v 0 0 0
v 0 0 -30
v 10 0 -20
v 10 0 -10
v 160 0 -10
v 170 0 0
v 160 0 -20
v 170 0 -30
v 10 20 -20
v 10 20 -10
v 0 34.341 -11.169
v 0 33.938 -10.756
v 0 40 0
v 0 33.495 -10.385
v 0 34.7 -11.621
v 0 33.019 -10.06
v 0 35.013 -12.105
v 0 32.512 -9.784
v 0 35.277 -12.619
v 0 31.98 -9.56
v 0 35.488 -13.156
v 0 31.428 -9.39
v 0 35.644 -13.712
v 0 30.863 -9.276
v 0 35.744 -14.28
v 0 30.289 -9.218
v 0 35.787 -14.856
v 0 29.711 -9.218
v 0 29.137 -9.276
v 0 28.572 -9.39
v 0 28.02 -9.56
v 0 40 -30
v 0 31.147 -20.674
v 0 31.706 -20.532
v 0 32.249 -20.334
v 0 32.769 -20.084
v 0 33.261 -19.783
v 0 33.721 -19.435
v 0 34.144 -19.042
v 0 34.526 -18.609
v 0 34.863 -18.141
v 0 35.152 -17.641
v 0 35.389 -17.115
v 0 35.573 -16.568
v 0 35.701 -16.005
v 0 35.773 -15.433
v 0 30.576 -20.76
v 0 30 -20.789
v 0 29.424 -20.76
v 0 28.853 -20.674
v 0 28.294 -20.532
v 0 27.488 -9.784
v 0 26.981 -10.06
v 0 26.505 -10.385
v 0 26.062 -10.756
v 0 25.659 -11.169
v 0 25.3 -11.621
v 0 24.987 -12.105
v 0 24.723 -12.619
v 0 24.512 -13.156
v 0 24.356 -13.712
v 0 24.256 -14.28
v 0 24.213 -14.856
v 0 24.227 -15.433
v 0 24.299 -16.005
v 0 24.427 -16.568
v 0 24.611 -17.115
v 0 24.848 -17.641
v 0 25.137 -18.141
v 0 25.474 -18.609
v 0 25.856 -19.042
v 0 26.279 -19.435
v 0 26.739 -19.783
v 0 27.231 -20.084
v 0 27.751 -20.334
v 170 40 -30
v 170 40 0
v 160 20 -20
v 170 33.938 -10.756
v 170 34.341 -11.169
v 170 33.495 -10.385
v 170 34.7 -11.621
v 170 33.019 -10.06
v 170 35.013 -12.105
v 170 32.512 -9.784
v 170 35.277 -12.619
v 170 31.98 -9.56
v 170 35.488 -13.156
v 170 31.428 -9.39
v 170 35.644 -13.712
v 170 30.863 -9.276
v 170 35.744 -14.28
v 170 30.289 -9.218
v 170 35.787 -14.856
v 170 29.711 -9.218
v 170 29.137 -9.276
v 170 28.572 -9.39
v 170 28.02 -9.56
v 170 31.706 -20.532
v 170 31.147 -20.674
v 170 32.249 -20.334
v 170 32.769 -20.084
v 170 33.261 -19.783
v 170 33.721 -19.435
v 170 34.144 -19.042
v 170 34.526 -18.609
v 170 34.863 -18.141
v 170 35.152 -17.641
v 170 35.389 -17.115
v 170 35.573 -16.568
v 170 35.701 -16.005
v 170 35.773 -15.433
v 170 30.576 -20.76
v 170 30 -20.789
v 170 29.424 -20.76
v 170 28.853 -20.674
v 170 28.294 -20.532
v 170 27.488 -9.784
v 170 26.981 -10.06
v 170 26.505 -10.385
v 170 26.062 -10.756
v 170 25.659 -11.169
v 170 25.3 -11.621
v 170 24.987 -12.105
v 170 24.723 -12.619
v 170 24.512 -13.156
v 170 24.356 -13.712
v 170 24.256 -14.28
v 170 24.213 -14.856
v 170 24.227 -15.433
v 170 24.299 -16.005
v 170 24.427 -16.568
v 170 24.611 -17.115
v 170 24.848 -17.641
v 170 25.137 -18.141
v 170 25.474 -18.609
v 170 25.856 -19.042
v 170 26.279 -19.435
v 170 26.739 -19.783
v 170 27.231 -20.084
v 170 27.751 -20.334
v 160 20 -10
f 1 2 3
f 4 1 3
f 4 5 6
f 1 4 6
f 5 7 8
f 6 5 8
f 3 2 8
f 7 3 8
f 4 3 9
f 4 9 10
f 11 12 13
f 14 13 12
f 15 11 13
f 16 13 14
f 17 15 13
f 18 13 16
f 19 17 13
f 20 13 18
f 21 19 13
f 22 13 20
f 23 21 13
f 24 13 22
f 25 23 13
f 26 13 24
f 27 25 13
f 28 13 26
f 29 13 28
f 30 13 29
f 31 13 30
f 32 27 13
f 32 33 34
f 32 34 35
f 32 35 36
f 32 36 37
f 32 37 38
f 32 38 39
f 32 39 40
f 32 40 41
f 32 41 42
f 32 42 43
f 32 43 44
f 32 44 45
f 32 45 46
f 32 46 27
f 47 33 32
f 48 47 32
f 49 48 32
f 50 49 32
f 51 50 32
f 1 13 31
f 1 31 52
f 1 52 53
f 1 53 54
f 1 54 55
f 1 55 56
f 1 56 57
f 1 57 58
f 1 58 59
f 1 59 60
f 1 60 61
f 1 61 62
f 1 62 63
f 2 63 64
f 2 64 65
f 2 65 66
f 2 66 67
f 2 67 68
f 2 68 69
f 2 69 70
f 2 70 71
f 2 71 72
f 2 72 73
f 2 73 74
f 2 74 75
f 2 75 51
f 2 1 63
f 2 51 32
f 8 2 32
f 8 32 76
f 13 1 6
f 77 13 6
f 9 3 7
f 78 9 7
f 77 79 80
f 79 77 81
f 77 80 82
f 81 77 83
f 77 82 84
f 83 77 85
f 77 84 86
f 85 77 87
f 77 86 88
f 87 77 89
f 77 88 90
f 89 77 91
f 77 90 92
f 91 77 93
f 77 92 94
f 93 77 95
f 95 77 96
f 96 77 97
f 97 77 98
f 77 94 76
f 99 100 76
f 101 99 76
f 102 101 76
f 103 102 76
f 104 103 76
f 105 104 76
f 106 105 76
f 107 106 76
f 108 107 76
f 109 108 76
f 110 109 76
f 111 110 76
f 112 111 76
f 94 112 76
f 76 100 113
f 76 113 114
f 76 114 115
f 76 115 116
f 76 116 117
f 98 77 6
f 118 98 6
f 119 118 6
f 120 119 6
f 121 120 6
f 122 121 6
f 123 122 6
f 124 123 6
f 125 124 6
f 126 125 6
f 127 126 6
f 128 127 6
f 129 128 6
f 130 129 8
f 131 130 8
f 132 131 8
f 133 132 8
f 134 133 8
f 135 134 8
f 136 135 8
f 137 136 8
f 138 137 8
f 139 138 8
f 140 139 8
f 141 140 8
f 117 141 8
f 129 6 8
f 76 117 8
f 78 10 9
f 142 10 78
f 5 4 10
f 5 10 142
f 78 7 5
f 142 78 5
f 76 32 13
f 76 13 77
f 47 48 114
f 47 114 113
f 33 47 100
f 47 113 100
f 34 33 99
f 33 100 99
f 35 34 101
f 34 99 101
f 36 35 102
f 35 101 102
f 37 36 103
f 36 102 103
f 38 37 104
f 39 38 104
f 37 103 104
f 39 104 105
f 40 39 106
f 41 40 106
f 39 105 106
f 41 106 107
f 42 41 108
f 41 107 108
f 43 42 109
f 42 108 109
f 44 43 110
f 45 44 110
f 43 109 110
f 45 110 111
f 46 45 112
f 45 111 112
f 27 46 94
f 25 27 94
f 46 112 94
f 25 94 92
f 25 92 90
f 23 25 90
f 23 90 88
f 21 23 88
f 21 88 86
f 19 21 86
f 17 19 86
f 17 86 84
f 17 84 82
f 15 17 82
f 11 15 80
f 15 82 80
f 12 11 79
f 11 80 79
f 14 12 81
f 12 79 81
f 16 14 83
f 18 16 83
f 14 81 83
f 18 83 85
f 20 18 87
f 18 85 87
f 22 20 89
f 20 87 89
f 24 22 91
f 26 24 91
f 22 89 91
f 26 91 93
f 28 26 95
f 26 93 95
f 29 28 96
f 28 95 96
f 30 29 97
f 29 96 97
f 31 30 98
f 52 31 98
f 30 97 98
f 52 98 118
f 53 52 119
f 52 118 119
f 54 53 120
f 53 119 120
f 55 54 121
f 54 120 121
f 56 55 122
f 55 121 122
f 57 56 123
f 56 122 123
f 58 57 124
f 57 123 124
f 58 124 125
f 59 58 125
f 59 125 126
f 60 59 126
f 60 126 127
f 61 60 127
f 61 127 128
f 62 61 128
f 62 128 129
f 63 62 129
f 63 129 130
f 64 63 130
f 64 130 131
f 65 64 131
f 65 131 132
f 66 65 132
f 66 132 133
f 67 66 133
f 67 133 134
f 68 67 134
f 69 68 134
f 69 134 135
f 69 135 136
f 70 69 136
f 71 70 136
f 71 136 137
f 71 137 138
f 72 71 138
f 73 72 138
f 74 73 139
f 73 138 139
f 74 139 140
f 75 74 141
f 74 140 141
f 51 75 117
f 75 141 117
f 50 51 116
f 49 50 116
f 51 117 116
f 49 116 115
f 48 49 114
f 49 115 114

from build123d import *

# Parameters (mm, degrees)
SKETCH2_W           = 170
SKETCH2_H           = 30
BOSS_EXTRUDE1_DEPTH = 40
SKETCH3_W           = 150
SKETCH3_H           = 10
CUT_EXTRUDE1_DEPTH  = 20
SKETCH4_R           = 5.789067321
CUT_EXTRUDE2_DEPTH  = 170


with BuildPart() as part:
    # Sketch2 → Boss-Extrude1 (new body)
    with BuildSketch(Plane(origin=(0, 0, 0), x_dir=(1, 0, 0), z_dir=(0, 1, 0))):
        with Locations((85, 15)):
            Rectangle(SKETCH2_W, SKETCH2_H)
    extrude(amount=BOSS_EXTRUDE1_DEPTH)

    # Sketch3 → Cut-Extrude1 (cut)
    with BuildSketch(Plane.XZ):
        with Locations((85, -15)):
            Rectangle(SKETCH3_W, SKETCH3_H)
    extrude(amount=-CUT_EXTRUDE1_DEPTH, mode=Mode.SUBTRACT)

    # Sketch4 → Cut-Extrude2 (cut)
    with BuildSketch(Plane(origin=(170, 0, 0), x_dir=(0, 0, -1), z_dir=(1, 0, 0))):
        with Locations((15, 30)):
            Circle(SKETCH4_R)
    extrude(amount=-CUT_EXTRUDE2_DEPTH, mode=Mode.SUBTRACT)


solid = part.part
